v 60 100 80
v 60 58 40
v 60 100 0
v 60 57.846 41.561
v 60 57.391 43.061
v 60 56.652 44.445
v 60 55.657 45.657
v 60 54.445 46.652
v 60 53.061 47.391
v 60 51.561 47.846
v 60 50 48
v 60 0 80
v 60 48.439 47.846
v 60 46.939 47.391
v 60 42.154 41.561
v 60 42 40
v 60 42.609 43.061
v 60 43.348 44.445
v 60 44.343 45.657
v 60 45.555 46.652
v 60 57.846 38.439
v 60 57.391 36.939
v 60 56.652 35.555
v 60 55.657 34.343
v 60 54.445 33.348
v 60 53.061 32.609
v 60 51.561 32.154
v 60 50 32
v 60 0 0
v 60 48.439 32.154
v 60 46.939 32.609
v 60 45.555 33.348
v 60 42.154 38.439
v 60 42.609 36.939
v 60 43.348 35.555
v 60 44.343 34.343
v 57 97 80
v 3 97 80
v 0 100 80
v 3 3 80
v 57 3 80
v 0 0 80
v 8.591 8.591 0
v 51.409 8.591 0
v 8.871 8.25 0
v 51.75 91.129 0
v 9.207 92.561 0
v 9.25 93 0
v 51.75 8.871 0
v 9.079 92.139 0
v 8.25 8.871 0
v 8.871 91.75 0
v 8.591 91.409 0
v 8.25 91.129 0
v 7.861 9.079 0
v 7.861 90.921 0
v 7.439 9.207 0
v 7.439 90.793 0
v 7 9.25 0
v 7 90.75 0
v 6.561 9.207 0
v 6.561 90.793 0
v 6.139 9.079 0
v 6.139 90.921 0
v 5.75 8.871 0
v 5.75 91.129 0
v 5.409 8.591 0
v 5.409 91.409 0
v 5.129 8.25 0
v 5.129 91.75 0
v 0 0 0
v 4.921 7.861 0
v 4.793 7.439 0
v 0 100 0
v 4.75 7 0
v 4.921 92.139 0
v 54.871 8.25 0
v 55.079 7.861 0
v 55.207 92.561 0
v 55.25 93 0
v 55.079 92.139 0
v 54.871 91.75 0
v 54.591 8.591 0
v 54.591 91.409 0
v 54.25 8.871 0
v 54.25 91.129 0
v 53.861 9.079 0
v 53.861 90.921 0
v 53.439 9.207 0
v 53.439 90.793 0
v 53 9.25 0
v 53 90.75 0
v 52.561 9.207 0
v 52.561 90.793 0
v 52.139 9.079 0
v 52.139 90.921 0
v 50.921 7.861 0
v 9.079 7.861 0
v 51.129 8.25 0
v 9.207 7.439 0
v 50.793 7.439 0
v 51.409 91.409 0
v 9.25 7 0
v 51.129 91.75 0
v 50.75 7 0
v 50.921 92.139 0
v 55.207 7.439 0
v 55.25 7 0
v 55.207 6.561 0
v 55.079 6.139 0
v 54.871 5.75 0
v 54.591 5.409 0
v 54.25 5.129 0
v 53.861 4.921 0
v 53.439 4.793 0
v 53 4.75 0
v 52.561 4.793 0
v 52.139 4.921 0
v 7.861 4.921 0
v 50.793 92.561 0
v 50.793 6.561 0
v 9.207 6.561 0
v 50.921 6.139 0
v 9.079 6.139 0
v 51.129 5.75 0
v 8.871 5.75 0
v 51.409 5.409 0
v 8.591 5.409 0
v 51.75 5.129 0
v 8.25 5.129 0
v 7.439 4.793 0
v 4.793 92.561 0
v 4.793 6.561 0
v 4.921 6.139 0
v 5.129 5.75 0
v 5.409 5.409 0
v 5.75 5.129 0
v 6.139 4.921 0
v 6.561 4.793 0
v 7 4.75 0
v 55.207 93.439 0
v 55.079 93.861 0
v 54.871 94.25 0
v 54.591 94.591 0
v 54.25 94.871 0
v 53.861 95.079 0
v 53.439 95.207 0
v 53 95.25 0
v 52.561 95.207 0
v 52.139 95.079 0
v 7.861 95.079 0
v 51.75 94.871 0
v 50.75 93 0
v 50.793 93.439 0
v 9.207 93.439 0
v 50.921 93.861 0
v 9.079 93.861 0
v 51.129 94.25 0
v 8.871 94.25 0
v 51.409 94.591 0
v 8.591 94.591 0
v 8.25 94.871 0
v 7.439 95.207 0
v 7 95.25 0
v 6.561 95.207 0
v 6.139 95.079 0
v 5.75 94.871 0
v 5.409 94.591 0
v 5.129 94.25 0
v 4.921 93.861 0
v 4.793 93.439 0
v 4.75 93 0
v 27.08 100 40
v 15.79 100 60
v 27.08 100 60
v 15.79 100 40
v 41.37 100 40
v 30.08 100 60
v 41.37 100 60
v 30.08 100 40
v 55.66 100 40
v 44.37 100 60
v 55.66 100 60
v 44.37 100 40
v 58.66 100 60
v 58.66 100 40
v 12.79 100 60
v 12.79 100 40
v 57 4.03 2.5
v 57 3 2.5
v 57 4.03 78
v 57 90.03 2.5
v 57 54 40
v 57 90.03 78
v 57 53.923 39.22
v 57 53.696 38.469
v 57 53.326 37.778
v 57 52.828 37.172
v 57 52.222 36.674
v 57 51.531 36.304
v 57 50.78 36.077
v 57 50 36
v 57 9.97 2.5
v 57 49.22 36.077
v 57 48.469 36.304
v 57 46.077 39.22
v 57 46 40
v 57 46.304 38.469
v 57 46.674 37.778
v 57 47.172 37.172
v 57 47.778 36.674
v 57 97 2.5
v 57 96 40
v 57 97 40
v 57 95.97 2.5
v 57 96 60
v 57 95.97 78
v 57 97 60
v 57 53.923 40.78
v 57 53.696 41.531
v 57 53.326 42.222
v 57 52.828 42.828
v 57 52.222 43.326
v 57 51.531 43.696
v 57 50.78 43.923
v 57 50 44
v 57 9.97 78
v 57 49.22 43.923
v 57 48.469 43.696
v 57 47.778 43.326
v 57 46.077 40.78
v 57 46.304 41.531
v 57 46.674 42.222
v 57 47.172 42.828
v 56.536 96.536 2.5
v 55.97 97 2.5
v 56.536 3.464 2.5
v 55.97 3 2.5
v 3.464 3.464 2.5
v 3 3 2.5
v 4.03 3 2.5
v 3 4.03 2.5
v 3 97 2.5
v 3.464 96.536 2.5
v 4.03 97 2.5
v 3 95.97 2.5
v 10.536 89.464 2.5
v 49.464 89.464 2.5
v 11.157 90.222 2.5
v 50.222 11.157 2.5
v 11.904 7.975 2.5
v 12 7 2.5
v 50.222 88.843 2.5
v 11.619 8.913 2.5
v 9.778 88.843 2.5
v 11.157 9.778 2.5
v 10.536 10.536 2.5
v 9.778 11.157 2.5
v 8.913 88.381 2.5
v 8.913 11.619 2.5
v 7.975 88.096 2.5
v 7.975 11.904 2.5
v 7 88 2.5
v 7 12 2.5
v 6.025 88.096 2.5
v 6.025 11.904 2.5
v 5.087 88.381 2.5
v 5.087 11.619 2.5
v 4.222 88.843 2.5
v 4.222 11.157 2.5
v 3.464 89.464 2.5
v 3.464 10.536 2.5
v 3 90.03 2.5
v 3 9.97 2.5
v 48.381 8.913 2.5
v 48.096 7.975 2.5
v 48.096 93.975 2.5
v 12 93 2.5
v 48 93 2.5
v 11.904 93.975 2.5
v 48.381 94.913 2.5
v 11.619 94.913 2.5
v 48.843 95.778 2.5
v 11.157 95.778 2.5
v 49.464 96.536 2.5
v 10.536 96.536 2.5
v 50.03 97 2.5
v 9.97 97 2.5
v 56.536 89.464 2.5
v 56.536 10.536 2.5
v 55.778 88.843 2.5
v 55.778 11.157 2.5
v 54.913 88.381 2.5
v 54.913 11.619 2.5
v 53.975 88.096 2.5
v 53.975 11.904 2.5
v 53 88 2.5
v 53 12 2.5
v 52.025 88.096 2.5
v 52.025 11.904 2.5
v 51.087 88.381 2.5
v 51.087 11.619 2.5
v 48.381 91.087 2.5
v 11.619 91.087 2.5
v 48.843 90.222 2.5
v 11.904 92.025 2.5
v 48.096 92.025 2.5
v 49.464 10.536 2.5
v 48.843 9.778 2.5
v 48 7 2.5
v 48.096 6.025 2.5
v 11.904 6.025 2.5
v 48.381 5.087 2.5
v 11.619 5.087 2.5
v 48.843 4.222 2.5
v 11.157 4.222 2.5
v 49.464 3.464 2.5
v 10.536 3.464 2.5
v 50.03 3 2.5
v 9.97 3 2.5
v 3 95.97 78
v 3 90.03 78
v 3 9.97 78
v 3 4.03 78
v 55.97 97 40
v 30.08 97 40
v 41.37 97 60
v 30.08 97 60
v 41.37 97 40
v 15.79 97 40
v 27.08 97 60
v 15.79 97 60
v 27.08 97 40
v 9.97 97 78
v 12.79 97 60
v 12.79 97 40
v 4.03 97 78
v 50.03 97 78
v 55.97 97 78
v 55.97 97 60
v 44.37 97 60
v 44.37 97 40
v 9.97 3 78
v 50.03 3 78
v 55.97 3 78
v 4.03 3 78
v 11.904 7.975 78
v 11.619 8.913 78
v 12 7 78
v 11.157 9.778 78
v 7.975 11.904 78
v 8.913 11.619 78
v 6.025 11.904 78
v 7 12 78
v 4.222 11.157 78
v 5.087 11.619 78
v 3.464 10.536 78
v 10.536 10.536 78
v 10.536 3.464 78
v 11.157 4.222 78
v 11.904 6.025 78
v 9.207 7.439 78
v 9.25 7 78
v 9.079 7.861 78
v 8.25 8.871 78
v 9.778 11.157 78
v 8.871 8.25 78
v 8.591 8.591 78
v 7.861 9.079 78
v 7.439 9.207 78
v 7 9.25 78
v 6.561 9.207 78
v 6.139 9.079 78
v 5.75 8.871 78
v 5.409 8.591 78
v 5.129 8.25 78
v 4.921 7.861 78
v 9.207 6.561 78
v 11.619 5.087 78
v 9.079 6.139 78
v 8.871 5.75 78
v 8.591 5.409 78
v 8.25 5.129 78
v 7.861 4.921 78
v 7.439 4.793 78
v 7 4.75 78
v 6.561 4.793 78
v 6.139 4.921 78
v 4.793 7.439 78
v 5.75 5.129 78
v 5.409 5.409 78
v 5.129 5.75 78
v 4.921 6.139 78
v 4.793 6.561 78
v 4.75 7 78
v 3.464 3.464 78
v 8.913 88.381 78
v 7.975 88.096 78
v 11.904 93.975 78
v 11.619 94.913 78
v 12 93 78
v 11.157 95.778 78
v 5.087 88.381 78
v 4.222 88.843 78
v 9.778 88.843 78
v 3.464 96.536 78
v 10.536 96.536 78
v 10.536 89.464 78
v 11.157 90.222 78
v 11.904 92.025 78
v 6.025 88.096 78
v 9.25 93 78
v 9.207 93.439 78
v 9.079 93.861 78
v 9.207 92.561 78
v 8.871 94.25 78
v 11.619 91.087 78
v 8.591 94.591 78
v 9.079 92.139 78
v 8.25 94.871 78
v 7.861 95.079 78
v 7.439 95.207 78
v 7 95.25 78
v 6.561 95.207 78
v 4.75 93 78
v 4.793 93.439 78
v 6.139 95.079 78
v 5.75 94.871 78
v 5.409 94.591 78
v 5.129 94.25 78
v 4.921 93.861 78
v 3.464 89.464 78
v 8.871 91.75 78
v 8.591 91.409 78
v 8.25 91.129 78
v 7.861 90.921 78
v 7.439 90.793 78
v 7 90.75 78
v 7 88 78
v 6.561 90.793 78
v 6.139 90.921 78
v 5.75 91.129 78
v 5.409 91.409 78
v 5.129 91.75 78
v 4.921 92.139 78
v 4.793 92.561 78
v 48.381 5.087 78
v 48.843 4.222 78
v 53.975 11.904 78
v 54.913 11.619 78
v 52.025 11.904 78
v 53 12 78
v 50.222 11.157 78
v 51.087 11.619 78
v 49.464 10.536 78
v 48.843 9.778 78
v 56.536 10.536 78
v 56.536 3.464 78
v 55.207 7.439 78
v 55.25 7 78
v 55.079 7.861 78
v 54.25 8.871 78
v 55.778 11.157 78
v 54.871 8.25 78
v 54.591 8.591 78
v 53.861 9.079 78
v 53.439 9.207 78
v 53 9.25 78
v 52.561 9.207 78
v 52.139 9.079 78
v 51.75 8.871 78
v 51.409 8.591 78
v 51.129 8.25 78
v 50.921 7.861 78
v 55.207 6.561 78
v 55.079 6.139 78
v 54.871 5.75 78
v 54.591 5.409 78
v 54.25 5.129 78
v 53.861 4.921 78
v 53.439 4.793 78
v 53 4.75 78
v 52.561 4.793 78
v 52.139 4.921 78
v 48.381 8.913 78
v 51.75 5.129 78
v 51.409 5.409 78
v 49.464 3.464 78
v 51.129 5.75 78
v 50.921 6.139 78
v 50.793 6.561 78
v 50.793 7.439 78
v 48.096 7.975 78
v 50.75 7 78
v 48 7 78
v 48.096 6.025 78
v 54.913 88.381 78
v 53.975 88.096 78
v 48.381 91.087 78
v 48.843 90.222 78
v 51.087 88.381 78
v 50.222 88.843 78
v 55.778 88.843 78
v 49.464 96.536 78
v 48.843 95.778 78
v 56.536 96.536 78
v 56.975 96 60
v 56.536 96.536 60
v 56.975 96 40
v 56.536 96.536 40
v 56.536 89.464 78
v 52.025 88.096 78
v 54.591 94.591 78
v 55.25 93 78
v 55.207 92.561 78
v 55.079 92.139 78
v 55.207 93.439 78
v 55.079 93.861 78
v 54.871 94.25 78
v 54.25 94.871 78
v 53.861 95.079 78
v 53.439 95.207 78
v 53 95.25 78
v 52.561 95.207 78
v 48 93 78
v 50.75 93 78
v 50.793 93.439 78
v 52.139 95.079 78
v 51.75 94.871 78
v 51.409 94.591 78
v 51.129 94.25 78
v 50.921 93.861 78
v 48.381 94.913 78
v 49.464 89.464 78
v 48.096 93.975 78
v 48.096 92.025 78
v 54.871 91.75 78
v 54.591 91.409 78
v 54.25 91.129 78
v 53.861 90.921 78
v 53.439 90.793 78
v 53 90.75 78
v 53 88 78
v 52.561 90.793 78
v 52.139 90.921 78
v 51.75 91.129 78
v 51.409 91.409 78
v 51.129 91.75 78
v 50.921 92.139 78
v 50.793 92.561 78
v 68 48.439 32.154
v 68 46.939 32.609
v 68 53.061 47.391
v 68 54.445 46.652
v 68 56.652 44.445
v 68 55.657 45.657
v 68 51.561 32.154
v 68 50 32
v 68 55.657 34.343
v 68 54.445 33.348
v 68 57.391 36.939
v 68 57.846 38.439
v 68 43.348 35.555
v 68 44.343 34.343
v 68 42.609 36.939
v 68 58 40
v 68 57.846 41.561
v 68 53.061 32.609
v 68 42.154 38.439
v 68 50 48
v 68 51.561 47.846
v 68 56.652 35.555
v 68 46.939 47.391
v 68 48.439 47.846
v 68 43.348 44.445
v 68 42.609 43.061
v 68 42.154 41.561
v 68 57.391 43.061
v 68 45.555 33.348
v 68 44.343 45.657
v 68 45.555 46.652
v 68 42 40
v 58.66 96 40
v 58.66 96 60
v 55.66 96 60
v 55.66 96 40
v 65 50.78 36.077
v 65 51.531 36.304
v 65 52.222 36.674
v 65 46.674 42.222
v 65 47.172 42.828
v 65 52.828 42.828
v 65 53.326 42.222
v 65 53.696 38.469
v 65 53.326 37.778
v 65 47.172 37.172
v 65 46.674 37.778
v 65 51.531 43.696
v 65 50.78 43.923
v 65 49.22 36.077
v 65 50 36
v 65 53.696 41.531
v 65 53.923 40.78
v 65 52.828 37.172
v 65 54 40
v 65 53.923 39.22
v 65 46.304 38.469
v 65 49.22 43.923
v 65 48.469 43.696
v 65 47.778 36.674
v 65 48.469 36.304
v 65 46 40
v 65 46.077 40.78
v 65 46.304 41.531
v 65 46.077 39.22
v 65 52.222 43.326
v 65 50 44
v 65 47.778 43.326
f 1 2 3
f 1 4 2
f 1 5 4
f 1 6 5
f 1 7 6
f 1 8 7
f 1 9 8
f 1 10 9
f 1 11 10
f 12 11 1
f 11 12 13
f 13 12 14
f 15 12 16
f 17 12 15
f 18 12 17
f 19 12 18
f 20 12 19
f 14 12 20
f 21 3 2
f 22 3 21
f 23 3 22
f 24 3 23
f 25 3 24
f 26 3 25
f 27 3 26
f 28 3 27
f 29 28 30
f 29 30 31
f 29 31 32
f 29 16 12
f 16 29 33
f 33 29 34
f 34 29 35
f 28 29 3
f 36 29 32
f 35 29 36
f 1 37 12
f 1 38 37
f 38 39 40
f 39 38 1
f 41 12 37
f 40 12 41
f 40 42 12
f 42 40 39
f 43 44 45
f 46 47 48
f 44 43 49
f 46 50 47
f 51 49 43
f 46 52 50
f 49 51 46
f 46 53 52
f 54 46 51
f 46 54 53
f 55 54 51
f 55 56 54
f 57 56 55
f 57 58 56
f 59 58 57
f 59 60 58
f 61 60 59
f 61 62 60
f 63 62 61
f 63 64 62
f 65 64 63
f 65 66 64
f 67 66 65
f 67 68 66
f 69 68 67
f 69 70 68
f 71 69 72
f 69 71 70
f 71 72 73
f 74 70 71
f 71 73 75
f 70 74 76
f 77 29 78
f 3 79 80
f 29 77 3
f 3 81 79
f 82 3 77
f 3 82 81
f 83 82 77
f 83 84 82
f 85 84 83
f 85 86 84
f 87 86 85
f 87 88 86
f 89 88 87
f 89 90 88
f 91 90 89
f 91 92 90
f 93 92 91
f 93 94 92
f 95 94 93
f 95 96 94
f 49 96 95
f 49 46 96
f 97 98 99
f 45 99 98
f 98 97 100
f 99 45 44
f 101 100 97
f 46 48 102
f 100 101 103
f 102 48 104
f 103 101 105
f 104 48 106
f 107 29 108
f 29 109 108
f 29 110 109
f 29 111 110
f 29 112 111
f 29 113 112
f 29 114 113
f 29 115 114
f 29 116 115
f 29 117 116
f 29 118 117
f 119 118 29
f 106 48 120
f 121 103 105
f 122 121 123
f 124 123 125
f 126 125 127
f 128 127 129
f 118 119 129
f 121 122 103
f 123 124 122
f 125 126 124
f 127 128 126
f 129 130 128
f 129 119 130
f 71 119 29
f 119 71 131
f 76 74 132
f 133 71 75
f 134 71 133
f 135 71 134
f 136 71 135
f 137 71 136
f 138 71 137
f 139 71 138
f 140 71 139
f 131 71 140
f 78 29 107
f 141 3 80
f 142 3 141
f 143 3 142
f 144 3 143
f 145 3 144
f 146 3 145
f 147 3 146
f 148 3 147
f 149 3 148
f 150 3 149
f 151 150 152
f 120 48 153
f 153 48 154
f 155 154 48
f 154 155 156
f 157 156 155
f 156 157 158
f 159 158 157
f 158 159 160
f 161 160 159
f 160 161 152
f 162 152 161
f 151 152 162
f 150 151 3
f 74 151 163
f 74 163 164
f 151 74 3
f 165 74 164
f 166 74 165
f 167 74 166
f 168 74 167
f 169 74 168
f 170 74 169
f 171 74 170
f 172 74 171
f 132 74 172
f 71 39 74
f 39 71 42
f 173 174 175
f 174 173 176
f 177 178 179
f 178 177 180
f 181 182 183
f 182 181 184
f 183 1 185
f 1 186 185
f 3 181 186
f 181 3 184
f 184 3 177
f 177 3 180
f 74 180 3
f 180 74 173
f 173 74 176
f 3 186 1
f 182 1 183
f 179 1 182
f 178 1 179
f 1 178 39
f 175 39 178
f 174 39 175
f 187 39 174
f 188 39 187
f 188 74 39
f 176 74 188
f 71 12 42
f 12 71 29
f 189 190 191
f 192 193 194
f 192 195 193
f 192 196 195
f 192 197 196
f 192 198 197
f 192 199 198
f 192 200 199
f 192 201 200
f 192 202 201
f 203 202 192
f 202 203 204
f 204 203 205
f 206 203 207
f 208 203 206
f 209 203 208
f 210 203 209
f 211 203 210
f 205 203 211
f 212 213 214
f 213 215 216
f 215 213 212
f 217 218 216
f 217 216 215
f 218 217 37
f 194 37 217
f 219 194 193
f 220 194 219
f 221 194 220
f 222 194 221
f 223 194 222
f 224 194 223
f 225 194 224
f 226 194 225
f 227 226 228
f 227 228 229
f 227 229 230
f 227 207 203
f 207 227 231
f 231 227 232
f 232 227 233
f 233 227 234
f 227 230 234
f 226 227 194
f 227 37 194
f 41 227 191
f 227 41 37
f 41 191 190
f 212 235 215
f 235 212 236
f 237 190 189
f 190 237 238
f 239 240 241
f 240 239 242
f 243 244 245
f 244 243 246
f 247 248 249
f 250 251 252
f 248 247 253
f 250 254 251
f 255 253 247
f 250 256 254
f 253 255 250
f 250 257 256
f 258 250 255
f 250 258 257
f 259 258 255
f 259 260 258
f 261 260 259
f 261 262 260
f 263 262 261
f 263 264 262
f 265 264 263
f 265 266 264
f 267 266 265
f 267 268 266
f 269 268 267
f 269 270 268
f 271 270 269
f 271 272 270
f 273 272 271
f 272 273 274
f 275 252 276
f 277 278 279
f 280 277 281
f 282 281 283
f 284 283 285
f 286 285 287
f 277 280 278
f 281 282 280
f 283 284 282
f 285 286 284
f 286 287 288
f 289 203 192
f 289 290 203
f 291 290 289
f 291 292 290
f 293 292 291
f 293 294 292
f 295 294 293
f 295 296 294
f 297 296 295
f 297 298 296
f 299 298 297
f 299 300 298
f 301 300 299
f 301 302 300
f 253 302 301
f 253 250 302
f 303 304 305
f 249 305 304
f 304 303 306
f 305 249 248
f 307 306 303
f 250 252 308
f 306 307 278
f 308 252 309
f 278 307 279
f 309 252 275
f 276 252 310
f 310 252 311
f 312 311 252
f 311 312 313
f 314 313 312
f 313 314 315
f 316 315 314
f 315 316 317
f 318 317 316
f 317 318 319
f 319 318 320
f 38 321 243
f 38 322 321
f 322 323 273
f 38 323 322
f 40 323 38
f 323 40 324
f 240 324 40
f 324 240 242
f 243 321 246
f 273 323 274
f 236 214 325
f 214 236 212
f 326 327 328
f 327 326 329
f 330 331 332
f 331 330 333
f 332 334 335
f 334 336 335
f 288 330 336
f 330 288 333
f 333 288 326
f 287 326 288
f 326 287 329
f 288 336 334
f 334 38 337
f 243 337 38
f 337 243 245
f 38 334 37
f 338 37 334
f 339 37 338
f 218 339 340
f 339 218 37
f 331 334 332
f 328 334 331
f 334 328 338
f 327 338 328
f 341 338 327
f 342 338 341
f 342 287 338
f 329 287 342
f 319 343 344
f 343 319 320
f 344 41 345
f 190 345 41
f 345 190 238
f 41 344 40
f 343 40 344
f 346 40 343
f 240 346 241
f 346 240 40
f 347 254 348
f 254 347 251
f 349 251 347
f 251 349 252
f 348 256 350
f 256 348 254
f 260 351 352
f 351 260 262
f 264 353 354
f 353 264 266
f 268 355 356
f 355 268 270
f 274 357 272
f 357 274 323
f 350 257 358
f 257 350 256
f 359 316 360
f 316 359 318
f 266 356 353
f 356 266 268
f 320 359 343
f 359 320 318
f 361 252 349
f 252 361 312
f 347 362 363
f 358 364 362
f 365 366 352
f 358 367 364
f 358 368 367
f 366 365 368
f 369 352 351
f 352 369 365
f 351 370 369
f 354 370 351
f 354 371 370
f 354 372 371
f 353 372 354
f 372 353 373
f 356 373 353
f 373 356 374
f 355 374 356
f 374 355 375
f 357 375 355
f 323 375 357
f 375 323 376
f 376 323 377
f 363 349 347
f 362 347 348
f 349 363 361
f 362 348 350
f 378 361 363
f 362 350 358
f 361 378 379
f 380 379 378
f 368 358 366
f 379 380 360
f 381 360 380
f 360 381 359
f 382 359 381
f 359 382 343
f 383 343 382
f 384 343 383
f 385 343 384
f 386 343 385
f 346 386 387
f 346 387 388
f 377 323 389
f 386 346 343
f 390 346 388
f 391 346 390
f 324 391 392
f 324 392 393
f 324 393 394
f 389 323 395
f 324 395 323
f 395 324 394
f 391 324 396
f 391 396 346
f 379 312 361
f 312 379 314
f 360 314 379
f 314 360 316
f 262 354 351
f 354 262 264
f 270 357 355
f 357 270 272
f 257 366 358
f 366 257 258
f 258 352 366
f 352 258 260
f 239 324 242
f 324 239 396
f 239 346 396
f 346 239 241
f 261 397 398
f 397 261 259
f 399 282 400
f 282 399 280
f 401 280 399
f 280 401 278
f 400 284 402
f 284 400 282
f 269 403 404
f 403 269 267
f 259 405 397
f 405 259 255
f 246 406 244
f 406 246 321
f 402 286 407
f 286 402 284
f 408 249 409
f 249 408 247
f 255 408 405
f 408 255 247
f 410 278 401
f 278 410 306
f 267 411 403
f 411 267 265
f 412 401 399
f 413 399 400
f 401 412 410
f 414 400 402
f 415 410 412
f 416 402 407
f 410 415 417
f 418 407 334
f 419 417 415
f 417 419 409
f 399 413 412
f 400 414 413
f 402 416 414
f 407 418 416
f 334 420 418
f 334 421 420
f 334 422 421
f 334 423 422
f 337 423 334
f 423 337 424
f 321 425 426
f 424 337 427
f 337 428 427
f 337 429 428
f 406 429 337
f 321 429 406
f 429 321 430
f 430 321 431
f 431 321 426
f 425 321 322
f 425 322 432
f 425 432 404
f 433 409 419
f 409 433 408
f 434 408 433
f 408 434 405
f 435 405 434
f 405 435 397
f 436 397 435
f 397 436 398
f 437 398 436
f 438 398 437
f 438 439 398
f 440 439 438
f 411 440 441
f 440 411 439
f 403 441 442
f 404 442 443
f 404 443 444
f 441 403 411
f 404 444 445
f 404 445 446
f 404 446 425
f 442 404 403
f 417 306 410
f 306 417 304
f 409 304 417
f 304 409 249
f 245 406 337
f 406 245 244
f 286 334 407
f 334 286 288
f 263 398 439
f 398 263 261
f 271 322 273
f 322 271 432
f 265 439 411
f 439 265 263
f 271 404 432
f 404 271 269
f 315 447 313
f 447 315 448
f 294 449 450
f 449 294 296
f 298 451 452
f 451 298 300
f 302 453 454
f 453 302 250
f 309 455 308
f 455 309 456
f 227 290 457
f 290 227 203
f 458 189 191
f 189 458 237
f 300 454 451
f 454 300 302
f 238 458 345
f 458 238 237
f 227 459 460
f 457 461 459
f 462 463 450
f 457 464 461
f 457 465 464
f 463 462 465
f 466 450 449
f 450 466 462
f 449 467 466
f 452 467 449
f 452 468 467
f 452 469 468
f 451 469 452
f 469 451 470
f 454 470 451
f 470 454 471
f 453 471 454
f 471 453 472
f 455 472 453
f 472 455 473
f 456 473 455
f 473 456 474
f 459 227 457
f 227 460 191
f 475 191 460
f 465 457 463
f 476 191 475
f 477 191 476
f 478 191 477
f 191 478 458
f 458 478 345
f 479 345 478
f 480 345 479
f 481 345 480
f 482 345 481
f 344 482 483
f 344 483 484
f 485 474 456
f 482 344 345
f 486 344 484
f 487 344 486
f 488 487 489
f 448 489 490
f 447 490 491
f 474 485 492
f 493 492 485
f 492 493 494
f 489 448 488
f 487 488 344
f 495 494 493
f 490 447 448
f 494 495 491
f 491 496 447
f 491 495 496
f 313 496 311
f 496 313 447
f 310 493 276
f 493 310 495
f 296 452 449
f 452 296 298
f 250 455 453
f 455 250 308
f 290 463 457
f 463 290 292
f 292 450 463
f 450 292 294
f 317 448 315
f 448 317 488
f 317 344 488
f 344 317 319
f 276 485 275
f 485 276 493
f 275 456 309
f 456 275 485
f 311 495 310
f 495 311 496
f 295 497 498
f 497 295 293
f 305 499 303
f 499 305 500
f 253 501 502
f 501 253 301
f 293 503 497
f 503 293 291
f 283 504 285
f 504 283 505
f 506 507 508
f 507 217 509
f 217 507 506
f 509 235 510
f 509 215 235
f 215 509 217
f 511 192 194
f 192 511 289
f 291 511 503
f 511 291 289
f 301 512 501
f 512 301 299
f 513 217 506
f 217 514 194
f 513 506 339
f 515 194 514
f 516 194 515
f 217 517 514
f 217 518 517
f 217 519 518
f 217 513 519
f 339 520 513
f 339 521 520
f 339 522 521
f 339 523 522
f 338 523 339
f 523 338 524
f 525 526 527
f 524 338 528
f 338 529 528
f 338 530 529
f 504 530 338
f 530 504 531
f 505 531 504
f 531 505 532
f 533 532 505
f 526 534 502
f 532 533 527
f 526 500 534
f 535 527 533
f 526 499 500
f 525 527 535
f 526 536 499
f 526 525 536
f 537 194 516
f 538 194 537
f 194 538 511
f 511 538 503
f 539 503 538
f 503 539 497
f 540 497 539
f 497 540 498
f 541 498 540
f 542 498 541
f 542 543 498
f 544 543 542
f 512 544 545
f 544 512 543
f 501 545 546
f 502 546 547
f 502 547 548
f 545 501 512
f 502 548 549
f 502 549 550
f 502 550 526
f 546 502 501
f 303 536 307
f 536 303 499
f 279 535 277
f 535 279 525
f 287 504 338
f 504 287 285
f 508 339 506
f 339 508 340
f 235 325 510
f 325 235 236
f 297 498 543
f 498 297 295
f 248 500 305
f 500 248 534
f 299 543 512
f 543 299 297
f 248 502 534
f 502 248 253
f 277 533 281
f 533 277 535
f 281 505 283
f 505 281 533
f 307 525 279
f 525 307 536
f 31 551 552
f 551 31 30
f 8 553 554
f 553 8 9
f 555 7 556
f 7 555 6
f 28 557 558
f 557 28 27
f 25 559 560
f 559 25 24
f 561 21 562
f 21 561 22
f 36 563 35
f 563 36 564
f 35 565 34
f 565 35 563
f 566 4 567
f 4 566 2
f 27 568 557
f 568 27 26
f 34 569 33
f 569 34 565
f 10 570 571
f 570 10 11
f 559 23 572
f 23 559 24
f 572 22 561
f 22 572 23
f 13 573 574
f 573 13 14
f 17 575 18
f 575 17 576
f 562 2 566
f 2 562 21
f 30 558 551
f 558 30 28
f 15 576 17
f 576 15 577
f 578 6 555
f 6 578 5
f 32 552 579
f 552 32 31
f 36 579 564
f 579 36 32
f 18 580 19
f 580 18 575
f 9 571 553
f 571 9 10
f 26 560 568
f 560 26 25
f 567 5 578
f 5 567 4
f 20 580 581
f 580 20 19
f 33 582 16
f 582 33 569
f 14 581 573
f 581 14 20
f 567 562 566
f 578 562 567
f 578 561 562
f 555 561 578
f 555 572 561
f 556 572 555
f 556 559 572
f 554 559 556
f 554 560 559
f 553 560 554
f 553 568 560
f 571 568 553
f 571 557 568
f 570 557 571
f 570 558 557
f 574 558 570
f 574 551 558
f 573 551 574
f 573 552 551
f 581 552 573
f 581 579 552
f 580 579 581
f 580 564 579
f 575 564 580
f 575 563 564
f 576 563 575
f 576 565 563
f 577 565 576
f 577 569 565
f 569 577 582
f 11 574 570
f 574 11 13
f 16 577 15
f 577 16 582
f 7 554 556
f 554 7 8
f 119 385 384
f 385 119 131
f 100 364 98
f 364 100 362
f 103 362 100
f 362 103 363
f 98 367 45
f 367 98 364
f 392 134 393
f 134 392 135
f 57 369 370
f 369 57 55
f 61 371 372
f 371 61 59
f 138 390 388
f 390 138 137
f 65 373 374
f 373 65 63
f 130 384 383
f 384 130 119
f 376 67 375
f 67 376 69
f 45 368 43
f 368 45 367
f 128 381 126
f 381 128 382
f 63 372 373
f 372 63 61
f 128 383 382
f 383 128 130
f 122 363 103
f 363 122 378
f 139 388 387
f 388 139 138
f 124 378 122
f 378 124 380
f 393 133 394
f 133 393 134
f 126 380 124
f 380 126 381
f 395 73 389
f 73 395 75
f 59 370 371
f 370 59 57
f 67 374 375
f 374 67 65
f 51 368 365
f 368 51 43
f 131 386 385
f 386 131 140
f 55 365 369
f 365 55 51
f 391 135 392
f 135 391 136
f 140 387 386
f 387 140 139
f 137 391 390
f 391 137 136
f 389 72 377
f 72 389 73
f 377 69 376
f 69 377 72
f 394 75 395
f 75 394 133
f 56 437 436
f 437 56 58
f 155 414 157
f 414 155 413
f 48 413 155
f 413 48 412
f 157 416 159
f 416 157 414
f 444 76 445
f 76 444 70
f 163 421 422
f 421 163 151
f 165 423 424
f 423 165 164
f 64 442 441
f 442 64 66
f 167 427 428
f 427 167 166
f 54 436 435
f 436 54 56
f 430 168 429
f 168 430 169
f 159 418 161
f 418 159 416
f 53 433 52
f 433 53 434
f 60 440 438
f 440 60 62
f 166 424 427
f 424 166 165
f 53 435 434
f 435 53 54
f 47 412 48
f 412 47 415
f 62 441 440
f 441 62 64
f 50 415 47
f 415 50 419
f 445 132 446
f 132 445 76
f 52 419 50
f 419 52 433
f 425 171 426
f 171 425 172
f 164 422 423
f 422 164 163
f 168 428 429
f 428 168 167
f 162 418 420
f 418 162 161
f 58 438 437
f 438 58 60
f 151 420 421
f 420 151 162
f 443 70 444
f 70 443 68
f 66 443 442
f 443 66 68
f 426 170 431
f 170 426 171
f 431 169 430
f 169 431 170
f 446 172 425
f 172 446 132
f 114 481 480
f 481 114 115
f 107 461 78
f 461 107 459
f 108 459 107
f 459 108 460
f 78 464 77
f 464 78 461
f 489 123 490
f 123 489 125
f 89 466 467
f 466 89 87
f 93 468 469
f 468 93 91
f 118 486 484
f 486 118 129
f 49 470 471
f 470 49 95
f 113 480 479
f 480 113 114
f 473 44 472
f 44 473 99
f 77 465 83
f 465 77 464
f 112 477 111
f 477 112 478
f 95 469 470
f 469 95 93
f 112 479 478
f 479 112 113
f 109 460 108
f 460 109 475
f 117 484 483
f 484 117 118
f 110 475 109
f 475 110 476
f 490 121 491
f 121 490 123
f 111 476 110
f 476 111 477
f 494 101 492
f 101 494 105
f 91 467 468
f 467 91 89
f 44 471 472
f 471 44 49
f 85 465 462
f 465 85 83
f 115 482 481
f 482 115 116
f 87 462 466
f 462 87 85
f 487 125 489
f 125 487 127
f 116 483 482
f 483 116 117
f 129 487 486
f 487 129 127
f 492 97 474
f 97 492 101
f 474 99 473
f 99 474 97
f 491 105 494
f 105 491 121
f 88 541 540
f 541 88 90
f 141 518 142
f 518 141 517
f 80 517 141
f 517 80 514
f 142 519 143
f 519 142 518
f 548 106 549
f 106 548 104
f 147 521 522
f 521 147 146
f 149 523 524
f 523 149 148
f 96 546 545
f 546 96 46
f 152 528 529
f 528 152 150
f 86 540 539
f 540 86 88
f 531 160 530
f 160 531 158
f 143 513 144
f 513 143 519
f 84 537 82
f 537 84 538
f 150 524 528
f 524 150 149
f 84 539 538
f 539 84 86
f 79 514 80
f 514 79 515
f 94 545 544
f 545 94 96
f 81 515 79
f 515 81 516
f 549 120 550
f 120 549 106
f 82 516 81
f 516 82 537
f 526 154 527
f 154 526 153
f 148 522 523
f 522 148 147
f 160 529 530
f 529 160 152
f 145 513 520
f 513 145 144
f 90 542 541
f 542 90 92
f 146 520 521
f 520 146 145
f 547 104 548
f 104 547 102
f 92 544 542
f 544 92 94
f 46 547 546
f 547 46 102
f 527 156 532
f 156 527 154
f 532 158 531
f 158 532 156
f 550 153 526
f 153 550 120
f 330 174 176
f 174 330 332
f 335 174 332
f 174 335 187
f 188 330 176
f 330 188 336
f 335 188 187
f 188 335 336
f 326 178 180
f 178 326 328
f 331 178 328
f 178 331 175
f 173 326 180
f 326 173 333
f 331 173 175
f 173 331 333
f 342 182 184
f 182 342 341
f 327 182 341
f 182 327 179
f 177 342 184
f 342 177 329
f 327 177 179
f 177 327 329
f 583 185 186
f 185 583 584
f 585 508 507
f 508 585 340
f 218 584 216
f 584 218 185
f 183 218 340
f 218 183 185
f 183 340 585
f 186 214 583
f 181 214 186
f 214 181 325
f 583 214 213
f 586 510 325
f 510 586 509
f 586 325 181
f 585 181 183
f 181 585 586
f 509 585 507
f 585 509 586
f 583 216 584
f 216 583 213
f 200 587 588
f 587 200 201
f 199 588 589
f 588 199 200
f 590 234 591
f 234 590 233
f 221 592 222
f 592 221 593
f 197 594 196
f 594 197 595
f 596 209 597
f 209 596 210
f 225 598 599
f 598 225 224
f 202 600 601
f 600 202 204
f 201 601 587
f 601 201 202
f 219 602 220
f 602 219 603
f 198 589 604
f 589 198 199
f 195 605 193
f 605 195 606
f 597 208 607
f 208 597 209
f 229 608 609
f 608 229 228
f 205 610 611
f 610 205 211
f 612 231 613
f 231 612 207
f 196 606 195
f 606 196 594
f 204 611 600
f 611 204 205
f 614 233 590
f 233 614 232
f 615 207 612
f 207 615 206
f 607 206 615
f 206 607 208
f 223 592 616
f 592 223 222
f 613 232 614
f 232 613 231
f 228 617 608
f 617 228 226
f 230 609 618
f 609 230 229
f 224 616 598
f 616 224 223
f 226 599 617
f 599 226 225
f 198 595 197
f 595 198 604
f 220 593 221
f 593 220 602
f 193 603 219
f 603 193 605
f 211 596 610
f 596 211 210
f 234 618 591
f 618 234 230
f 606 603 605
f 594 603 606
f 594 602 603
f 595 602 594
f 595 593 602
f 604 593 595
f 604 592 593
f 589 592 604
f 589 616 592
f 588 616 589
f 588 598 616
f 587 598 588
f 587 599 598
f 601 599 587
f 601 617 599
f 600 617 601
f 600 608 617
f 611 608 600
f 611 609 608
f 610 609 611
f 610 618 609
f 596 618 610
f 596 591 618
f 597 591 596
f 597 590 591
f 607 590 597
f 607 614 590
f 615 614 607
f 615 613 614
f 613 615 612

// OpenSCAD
$fn = 32;

// ----------------------------------------------------------------------
// Enclosure body: 60 x 100 x 80 mm, wall 3 mm
// ----------------------------------------------------------------------

// --- parameters (mm) ---
length = 60;              // outside length, X
width = 100;              // outside width, Y
height = 80;              // outside height, Z
wall = 3;                 // side wall thickness
floor_t = 2.5;            // floor thickness
boss_d = 10;              // corner boss diameter
boss_h = 75.5;            // corner boss height above the floor
boss_hole_d = 4.5;        // lid screw clearance in the boss
boss_lip = 7;             // boss centre inset from the corner
vent_slots = 6;           // vent slots in the long wall
vent_w = 3;               // vent slot width
vent_h = 20;              // vent slot height
vent_pitch = 14.29;       // vent slot pitch
vent_z = 40;              // vent slot sill height
nipple_d = 16;            // cable gland boss diameter
nipple_h = 8;             // cable gland boss height
nipple_bore = 8;          // cable gland bore

module shell() {
  difference() {
    cube([length, width, height]);
    /* hollow, open at the top */
    translate([wall, wall, floor_t])
      cube([length - 2 * wall, width - 2 * wall, height]);
  }
}

module bosses() {
  /* corner bosses, sunk 1 mm into the floor */
  for (sx = [0, 1]) for (sy = [0, 1])
    translate([sx * (length - 2 * boss_lip) + boss_lip, sy * (width - 2 * boss_lip) + boss_lip, floor_t - 1])
      cylinder(h = boss_h + 1, d = boss_d);
}

module gland() {
  /* boss on the short wall, sunk 1 mm into it */
  translate([length - 1, width / 2, height * 0.5]) rotate([0, 90, 0])
    cylinder(h = nipple_h + 1, d = nipple_d);
}

difference() {
  union() {
    shell();
    bosses();
    gland();
  }
  /* boss screw holes */
  for (sx = [0, 1]) for (sy = [0, 1])
    translate([sx * (length - 2 * boss_lip) + boss_lip, sy * (width - 2 * boss_lip) + boss_lip, -1]) cylinder(h = floor_t + boss_h + 2, d = boss_hole_d);
  /* vent grille in the +Y wall */
  for (i = [0 : vent_slots - 1]) translate([vent_pitch * (i + 1) - vent_w / 2, width - wall - 1, vent_z]) cube([vent_w, wall + 2, vent_h]);
  translate([length, width / 2, height * 0.5]) rotate([0, 90, 0]) translate([0, 0, -nipple_h - 2]) cylinder(h = nipple_h + wall + 4, d = nipple_bore);
}
